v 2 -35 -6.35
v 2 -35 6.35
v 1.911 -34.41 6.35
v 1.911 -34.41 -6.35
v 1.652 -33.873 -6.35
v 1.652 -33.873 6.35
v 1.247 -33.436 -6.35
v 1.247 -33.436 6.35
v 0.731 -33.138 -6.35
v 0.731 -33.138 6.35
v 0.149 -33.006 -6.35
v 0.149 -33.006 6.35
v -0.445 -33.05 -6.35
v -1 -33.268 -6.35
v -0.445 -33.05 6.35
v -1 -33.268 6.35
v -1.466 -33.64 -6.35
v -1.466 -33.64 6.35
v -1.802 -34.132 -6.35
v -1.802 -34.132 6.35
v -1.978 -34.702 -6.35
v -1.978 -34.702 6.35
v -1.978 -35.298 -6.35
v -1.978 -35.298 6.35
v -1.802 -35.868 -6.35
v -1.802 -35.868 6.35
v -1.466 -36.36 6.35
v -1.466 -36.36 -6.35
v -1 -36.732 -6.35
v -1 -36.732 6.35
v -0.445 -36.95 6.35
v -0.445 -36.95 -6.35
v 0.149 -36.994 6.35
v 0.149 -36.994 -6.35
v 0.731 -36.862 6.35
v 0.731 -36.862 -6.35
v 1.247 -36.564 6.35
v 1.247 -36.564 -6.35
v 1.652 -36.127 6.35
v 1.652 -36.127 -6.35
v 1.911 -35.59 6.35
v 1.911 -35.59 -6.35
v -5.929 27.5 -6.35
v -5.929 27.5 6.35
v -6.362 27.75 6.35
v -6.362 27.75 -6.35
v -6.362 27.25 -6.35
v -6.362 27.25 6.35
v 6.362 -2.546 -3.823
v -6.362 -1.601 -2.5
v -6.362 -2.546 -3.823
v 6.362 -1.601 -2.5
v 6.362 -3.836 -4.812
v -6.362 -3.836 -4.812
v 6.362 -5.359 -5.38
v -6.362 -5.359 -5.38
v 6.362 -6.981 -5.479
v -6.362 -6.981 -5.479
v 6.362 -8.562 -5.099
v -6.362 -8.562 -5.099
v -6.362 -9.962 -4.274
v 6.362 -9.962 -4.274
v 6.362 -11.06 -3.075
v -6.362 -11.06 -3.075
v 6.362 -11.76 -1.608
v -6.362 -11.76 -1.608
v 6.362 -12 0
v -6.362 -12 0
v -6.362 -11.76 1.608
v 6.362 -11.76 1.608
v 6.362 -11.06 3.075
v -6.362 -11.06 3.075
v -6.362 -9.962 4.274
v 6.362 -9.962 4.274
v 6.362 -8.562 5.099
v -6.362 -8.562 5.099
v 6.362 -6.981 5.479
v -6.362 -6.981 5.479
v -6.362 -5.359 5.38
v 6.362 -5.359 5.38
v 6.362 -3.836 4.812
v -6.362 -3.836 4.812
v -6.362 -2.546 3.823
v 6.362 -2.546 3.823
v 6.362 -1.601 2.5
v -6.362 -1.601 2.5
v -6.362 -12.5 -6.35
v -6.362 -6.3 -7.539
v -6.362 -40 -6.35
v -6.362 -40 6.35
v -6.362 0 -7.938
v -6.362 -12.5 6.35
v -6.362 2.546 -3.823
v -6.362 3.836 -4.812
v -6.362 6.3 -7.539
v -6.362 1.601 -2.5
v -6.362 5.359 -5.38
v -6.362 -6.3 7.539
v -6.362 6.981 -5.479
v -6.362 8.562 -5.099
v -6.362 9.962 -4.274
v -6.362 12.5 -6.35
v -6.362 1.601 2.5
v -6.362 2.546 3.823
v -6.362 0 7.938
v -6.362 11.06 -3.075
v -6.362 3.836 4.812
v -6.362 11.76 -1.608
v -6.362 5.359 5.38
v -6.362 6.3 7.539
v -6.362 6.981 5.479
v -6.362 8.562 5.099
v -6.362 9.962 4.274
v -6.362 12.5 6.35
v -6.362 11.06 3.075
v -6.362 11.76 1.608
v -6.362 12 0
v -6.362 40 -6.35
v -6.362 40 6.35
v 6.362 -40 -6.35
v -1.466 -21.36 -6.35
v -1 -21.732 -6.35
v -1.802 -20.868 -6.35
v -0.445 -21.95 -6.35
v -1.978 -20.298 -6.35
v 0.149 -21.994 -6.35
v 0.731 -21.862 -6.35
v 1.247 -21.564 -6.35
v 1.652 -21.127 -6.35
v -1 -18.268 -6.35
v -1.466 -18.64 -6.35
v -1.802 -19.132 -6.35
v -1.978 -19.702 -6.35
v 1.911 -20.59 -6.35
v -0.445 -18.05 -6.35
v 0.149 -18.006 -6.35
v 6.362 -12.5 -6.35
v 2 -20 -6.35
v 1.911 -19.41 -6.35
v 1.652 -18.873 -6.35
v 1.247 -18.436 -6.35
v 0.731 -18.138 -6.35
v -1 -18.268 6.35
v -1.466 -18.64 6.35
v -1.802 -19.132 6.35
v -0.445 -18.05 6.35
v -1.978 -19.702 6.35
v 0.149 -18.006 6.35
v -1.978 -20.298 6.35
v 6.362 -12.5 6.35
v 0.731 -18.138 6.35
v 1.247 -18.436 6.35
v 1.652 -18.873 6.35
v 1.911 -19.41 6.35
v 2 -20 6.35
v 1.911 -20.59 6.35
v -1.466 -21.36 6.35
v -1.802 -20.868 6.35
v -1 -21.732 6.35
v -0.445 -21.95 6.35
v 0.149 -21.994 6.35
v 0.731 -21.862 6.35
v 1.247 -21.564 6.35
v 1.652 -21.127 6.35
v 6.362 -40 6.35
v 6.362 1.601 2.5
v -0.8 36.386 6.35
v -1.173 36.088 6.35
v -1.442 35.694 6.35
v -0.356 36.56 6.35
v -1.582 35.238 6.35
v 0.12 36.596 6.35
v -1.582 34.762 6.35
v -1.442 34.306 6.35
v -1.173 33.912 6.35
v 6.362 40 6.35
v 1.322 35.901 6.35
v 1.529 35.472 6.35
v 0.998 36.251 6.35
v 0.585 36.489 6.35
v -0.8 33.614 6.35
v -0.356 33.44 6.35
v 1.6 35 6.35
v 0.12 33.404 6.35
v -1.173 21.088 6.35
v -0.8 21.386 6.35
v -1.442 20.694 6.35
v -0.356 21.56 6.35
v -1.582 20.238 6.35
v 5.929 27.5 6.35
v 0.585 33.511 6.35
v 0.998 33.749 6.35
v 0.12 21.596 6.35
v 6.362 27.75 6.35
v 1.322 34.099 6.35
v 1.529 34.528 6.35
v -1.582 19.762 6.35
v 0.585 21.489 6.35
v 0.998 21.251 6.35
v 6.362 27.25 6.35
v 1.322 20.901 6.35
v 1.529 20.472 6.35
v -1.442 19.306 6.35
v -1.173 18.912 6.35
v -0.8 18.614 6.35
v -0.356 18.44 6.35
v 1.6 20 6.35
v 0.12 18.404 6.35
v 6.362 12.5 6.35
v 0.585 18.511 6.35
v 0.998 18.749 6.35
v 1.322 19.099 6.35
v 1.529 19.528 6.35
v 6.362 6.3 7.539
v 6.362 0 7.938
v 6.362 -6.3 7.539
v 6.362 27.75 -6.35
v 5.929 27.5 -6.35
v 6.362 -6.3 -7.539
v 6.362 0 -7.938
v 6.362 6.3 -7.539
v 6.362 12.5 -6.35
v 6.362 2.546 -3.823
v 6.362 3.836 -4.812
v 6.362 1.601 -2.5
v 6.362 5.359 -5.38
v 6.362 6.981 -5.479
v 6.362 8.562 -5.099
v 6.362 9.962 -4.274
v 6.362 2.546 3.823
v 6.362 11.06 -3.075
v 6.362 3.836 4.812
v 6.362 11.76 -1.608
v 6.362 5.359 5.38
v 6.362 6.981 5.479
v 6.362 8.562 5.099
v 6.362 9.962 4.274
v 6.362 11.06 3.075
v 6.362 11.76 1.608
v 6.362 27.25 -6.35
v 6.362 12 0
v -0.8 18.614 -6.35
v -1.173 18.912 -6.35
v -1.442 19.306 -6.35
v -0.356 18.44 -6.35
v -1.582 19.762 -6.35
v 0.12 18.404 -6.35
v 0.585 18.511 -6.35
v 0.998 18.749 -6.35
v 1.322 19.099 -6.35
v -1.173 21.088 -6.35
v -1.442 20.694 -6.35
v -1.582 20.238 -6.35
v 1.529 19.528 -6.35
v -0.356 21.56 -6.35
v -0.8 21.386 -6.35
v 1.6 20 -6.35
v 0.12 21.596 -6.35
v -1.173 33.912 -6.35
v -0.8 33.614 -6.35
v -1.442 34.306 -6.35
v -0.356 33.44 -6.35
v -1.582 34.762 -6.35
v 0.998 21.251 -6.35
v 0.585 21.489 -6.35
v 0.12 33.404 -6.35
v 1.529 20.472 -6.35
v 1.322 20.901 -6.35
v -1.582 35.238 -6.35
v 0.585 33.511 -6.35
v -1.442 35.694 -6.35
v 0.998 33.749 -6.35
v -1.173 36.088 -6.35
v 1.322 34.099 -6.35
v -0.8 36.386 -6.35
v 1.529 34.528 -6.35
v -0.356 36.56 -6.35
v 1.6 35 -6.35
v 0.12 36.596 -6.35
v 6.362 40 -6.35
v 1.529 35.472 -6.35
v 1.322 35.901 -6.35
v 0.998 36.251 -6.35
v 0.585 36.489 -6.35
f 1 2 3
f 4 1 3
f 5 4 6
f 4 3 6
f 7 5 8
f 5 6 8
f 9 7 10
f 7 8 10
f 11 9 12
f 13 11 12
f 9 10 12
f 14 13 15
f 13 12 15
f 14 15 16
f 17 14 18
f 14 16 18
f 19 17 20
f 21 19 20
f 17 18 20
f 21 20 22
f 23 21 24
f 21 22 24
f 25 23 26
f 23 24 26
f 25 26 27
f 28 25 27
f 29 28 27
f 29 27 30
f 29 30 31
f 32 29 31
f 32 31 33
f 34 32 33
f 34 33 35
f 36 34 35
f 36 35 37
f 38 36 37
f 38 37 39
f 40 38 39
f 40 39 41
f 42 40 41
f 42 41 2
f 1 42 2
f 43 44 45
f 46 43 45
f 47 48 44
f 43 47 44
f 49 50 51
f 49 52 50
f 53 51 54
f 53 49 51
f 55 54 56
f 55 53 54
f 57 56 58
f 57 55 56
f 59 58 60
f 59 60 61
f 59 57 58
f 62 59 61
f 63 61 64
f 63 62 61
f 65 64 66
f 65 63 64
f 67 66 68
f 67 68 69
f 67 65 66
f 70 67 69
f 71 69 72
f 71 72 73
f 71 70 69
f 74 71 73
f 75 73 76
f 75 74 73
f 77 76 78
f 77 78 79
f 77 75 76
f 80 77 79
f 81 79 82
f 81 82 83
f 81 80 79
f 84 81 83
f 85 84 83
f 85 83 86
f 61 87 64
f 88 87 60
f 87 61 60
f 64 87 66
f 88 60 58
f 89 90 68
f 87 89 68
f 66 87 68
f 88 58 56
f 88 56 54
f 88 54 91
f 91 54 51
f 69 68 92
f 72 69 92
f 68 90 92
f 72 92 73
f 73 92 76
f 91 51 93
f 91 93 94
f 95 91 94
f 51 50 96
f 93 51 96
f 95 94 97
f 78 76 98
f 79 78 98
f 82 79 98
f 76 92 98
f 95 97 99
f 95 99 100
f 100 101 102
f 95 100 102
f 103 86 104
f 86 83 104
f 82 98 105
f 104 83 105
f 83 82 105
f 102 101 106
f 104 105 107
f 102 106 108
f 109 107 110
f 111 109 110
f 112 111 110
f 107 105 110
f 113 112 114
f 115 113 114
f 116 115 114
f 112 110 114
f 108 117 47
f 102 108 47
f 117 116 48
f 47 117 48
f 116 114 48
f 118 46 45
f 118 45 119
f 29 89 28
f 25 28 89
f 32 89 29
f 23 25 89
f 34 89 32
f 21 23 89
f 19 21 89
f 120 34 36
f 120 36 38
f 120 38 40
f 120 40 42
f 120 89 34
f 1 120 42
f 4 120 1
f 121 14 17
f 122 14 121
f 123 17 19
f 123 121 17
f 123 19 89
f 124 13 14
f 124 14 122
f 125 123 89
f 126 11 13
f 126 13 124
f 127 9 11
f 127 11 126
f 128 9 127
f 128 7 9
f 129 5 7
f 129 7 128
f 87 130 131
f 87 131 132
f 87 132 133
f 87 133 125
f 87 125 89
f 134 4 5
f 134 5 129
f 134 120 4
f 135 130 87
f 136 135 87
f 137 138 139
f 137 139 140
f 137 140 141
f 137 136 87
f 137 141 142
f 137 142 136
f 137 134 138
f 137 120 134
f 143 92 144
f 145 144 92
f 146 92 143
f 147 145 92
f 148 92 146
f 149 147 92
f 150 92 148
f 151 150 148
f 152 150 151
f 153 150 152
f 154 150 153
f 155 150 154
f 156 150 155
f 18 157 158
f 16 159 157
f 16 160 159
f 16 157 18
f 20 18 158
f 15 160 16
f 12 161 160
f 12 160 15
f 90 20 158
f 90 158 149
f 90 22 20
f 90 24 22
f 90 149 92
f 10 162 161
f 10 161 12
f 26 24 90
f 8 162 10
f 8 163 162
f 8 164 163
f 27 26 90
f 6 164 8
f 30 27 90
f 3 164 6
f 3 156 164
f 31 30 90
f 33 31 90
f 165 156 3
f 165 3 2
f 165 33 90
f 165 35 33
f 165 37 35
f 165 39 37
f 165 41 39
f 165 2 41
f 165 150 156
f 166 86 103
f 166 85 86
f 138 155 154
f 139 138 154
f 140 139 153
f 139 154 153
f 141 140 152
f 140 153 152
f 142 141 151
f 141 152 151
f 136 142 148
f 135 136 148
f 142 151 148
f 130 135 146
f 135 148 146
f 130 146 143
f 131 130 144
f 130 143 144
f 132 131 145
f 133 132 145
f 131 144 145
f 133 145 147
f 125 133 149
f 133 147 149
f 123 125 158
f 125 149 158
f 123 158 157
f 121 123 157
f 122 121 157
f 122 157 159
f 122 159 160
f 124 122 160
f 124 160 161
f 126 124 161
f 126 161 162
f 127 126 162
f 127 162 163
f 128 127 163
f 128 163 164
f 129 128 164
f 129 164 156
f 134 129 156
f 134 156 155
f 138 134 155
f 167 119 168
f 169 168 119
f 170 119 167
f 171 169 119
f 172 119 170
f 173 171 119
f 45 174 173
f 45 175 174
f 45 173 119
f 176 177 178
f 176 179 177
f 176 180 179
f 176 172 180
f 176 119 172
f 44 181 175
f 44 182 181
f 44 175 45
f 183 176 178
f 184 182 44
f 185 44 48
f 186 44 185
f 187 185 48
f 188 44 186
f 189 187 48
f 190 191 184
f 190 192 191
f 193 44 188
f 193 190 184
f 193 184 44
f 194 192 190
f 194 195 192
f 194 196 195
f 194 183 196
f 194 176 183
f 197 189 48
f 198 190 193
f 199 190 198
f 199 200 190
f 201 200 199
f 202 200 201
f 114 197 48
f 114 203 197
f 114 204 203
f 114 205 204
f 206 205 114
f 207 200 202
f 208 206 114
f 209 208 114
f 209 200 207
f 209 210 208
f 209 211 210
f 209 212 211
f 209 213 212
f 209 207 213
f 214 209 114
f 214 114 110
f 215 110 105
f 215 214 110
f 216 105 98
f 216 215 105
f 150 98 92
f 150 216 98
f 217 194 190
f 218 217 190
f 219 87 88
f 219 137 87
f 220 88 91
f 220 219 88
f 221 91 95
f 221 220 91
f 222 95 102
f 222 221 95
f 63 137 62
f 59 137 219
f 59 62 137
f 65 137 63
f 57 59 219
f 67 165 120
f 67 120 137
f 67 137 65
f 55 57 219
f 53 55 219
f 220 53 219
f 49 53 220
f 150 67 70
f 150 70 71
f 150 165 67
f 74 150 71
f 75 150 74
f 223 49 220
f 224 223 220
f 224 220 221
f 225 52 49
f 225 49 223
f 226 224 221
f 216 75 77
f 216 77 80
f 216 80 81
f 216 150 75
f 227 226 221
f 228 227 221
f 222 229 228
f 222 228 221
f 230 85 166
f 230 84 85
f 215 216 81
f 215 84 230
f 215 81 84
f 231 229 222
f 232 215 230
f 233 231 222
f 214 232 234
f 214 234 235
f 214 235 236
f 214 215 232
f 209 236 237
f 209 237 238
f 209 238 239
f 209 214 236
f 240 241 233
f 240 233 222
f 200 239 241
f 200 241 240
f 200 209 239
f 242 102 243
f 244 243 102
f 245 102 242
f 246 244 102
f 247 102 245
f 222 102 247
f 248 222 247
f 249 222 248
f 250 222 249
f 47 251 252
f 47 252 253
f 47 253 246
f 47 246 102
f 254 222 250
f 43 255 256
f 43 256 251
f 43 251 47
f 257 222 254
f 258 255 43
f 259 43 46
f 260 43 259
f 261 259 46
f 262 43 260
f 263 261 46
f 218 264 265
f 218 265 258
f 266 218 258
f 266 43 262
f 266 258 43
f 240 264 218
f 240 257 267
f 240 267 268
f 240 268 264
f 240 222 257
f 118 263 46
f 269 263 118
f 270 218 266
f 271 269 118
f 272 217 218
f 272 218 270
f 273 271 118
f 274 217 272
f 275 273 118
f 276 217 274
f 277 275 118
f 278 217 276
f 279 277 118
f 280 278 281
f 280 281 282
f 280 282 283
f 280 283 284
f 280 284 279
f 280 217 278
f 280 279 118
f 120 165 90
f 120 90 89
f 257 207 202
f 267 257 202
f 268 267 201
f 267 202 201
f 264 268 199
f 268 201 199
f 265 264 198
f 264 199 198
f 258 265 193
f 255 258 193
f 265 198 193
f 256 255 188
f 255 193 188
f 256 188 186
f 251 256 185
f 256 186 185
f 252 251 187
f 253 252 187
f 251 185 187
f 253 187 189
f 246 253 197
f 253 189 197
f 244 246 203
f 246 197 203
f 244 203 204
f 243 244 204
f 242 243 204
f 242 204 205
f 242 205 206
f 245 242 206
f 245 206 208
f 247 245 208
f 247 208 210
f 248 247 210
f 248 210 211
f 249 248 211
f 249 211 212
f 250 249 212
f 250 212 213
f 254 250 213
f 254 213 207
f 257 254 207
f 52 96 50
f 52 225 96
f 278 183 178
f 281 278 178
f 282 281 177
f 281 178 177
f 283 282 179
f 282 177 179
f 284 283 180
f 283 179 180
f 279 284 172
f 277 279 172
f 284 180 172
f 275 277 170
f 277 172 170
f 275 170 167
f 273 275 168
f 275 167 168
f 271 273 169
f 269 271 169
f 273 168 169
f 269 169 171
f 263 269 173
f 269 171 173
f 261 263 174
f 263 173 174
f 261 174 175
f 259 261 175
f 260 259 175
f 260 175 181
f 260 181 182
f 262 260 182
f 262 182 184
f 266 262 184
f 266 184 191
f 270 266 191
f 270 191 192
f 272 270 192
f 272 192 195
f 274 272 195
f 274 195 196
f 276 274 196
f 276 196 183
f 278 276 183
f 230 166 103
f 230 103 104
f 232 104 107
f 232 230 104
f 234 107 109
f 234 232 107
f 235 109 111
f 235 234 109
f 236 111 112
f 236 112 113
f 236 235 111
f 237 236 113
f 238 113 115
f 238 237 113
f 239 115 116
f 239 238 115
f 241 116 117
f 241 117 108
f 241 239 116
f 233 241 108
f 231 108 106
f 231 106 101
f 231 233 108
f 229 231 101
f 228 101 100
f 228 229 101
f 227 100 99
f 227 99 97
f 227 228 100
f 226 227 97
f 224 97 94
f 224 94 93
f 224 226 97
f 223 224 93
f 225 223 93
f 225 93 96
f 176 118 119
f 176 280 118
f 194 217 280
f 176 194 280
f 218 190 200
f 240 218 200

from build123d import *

# Parameters (mm, degrees)
F1_DEPTH = 6.3625
F2_R     = 2
F2_R_2   = 1.6
F3_DEPTH = 14.288708


with BuildPart() as f1:
    # F0 (on Right) → F1 (new body, symmetric)
    with BuildSketch(Plane.YZ):
        with BuildLine():
            Line((40, -6.35), (40, 6.35))
            Line((40, 6.35), (12.5, 6.35))
            ThreePointArc((12.5, 6.35), (0, 7.937708), (-12.5, 6.35))
            Line((-12.5, 6.35), (-40, 6.35))
            Line((-40, 6.35), (-40, -6.35))
            Line((-40, -6.35), (-12.5, -6.35))
            ThreePointArc((-12.5, -6.35), (0, -7.937708), (12.5, -6.35))
            Line((12.5, -6.35), (40, -6.35))
        make_face()
        with BuildLine():
            ThreePointArc((1.601021, 2.5), (12, 0), (1.601021, -2.5))
            Line((1.601021, -2.5), (-1.601021, -2.5))
            ThreePointArc((-1.601021, -2.5), (-12, 0), (-1.601021, 2.5))
            Line((-1.601021, 2.5), (1.601021, 2.5))
        make_face(mode=Mode.SUBTRACT)
    extrude(amount=F1_DEPTH, both=True)

    # F2 (on face) → F3 (cut, through all)
    with BuildSketch(Plane.XY.offset(6.35)):
        with Locations((0, -20)):
            Circle(F2_R)
        with Locations((0, -35)):
            Circle(F2_R)
        with Locations((0, 20)):
            Circle(F2_R_2)
        with Locations((0, 35)):
            Circle(F2_R_2)
        Polygon((6.3625, 27.25), (6.3625, 27.75), (5.929487, 27.5), align=None)
        Polygon((-5.929487, 27.5), (-6.3625, 27.75), (-6.3625, 27.25), align=None)
    extrude(amount=-F3_DEPTH, mode=Mode.SUBTRACT)


solid = f1.part
